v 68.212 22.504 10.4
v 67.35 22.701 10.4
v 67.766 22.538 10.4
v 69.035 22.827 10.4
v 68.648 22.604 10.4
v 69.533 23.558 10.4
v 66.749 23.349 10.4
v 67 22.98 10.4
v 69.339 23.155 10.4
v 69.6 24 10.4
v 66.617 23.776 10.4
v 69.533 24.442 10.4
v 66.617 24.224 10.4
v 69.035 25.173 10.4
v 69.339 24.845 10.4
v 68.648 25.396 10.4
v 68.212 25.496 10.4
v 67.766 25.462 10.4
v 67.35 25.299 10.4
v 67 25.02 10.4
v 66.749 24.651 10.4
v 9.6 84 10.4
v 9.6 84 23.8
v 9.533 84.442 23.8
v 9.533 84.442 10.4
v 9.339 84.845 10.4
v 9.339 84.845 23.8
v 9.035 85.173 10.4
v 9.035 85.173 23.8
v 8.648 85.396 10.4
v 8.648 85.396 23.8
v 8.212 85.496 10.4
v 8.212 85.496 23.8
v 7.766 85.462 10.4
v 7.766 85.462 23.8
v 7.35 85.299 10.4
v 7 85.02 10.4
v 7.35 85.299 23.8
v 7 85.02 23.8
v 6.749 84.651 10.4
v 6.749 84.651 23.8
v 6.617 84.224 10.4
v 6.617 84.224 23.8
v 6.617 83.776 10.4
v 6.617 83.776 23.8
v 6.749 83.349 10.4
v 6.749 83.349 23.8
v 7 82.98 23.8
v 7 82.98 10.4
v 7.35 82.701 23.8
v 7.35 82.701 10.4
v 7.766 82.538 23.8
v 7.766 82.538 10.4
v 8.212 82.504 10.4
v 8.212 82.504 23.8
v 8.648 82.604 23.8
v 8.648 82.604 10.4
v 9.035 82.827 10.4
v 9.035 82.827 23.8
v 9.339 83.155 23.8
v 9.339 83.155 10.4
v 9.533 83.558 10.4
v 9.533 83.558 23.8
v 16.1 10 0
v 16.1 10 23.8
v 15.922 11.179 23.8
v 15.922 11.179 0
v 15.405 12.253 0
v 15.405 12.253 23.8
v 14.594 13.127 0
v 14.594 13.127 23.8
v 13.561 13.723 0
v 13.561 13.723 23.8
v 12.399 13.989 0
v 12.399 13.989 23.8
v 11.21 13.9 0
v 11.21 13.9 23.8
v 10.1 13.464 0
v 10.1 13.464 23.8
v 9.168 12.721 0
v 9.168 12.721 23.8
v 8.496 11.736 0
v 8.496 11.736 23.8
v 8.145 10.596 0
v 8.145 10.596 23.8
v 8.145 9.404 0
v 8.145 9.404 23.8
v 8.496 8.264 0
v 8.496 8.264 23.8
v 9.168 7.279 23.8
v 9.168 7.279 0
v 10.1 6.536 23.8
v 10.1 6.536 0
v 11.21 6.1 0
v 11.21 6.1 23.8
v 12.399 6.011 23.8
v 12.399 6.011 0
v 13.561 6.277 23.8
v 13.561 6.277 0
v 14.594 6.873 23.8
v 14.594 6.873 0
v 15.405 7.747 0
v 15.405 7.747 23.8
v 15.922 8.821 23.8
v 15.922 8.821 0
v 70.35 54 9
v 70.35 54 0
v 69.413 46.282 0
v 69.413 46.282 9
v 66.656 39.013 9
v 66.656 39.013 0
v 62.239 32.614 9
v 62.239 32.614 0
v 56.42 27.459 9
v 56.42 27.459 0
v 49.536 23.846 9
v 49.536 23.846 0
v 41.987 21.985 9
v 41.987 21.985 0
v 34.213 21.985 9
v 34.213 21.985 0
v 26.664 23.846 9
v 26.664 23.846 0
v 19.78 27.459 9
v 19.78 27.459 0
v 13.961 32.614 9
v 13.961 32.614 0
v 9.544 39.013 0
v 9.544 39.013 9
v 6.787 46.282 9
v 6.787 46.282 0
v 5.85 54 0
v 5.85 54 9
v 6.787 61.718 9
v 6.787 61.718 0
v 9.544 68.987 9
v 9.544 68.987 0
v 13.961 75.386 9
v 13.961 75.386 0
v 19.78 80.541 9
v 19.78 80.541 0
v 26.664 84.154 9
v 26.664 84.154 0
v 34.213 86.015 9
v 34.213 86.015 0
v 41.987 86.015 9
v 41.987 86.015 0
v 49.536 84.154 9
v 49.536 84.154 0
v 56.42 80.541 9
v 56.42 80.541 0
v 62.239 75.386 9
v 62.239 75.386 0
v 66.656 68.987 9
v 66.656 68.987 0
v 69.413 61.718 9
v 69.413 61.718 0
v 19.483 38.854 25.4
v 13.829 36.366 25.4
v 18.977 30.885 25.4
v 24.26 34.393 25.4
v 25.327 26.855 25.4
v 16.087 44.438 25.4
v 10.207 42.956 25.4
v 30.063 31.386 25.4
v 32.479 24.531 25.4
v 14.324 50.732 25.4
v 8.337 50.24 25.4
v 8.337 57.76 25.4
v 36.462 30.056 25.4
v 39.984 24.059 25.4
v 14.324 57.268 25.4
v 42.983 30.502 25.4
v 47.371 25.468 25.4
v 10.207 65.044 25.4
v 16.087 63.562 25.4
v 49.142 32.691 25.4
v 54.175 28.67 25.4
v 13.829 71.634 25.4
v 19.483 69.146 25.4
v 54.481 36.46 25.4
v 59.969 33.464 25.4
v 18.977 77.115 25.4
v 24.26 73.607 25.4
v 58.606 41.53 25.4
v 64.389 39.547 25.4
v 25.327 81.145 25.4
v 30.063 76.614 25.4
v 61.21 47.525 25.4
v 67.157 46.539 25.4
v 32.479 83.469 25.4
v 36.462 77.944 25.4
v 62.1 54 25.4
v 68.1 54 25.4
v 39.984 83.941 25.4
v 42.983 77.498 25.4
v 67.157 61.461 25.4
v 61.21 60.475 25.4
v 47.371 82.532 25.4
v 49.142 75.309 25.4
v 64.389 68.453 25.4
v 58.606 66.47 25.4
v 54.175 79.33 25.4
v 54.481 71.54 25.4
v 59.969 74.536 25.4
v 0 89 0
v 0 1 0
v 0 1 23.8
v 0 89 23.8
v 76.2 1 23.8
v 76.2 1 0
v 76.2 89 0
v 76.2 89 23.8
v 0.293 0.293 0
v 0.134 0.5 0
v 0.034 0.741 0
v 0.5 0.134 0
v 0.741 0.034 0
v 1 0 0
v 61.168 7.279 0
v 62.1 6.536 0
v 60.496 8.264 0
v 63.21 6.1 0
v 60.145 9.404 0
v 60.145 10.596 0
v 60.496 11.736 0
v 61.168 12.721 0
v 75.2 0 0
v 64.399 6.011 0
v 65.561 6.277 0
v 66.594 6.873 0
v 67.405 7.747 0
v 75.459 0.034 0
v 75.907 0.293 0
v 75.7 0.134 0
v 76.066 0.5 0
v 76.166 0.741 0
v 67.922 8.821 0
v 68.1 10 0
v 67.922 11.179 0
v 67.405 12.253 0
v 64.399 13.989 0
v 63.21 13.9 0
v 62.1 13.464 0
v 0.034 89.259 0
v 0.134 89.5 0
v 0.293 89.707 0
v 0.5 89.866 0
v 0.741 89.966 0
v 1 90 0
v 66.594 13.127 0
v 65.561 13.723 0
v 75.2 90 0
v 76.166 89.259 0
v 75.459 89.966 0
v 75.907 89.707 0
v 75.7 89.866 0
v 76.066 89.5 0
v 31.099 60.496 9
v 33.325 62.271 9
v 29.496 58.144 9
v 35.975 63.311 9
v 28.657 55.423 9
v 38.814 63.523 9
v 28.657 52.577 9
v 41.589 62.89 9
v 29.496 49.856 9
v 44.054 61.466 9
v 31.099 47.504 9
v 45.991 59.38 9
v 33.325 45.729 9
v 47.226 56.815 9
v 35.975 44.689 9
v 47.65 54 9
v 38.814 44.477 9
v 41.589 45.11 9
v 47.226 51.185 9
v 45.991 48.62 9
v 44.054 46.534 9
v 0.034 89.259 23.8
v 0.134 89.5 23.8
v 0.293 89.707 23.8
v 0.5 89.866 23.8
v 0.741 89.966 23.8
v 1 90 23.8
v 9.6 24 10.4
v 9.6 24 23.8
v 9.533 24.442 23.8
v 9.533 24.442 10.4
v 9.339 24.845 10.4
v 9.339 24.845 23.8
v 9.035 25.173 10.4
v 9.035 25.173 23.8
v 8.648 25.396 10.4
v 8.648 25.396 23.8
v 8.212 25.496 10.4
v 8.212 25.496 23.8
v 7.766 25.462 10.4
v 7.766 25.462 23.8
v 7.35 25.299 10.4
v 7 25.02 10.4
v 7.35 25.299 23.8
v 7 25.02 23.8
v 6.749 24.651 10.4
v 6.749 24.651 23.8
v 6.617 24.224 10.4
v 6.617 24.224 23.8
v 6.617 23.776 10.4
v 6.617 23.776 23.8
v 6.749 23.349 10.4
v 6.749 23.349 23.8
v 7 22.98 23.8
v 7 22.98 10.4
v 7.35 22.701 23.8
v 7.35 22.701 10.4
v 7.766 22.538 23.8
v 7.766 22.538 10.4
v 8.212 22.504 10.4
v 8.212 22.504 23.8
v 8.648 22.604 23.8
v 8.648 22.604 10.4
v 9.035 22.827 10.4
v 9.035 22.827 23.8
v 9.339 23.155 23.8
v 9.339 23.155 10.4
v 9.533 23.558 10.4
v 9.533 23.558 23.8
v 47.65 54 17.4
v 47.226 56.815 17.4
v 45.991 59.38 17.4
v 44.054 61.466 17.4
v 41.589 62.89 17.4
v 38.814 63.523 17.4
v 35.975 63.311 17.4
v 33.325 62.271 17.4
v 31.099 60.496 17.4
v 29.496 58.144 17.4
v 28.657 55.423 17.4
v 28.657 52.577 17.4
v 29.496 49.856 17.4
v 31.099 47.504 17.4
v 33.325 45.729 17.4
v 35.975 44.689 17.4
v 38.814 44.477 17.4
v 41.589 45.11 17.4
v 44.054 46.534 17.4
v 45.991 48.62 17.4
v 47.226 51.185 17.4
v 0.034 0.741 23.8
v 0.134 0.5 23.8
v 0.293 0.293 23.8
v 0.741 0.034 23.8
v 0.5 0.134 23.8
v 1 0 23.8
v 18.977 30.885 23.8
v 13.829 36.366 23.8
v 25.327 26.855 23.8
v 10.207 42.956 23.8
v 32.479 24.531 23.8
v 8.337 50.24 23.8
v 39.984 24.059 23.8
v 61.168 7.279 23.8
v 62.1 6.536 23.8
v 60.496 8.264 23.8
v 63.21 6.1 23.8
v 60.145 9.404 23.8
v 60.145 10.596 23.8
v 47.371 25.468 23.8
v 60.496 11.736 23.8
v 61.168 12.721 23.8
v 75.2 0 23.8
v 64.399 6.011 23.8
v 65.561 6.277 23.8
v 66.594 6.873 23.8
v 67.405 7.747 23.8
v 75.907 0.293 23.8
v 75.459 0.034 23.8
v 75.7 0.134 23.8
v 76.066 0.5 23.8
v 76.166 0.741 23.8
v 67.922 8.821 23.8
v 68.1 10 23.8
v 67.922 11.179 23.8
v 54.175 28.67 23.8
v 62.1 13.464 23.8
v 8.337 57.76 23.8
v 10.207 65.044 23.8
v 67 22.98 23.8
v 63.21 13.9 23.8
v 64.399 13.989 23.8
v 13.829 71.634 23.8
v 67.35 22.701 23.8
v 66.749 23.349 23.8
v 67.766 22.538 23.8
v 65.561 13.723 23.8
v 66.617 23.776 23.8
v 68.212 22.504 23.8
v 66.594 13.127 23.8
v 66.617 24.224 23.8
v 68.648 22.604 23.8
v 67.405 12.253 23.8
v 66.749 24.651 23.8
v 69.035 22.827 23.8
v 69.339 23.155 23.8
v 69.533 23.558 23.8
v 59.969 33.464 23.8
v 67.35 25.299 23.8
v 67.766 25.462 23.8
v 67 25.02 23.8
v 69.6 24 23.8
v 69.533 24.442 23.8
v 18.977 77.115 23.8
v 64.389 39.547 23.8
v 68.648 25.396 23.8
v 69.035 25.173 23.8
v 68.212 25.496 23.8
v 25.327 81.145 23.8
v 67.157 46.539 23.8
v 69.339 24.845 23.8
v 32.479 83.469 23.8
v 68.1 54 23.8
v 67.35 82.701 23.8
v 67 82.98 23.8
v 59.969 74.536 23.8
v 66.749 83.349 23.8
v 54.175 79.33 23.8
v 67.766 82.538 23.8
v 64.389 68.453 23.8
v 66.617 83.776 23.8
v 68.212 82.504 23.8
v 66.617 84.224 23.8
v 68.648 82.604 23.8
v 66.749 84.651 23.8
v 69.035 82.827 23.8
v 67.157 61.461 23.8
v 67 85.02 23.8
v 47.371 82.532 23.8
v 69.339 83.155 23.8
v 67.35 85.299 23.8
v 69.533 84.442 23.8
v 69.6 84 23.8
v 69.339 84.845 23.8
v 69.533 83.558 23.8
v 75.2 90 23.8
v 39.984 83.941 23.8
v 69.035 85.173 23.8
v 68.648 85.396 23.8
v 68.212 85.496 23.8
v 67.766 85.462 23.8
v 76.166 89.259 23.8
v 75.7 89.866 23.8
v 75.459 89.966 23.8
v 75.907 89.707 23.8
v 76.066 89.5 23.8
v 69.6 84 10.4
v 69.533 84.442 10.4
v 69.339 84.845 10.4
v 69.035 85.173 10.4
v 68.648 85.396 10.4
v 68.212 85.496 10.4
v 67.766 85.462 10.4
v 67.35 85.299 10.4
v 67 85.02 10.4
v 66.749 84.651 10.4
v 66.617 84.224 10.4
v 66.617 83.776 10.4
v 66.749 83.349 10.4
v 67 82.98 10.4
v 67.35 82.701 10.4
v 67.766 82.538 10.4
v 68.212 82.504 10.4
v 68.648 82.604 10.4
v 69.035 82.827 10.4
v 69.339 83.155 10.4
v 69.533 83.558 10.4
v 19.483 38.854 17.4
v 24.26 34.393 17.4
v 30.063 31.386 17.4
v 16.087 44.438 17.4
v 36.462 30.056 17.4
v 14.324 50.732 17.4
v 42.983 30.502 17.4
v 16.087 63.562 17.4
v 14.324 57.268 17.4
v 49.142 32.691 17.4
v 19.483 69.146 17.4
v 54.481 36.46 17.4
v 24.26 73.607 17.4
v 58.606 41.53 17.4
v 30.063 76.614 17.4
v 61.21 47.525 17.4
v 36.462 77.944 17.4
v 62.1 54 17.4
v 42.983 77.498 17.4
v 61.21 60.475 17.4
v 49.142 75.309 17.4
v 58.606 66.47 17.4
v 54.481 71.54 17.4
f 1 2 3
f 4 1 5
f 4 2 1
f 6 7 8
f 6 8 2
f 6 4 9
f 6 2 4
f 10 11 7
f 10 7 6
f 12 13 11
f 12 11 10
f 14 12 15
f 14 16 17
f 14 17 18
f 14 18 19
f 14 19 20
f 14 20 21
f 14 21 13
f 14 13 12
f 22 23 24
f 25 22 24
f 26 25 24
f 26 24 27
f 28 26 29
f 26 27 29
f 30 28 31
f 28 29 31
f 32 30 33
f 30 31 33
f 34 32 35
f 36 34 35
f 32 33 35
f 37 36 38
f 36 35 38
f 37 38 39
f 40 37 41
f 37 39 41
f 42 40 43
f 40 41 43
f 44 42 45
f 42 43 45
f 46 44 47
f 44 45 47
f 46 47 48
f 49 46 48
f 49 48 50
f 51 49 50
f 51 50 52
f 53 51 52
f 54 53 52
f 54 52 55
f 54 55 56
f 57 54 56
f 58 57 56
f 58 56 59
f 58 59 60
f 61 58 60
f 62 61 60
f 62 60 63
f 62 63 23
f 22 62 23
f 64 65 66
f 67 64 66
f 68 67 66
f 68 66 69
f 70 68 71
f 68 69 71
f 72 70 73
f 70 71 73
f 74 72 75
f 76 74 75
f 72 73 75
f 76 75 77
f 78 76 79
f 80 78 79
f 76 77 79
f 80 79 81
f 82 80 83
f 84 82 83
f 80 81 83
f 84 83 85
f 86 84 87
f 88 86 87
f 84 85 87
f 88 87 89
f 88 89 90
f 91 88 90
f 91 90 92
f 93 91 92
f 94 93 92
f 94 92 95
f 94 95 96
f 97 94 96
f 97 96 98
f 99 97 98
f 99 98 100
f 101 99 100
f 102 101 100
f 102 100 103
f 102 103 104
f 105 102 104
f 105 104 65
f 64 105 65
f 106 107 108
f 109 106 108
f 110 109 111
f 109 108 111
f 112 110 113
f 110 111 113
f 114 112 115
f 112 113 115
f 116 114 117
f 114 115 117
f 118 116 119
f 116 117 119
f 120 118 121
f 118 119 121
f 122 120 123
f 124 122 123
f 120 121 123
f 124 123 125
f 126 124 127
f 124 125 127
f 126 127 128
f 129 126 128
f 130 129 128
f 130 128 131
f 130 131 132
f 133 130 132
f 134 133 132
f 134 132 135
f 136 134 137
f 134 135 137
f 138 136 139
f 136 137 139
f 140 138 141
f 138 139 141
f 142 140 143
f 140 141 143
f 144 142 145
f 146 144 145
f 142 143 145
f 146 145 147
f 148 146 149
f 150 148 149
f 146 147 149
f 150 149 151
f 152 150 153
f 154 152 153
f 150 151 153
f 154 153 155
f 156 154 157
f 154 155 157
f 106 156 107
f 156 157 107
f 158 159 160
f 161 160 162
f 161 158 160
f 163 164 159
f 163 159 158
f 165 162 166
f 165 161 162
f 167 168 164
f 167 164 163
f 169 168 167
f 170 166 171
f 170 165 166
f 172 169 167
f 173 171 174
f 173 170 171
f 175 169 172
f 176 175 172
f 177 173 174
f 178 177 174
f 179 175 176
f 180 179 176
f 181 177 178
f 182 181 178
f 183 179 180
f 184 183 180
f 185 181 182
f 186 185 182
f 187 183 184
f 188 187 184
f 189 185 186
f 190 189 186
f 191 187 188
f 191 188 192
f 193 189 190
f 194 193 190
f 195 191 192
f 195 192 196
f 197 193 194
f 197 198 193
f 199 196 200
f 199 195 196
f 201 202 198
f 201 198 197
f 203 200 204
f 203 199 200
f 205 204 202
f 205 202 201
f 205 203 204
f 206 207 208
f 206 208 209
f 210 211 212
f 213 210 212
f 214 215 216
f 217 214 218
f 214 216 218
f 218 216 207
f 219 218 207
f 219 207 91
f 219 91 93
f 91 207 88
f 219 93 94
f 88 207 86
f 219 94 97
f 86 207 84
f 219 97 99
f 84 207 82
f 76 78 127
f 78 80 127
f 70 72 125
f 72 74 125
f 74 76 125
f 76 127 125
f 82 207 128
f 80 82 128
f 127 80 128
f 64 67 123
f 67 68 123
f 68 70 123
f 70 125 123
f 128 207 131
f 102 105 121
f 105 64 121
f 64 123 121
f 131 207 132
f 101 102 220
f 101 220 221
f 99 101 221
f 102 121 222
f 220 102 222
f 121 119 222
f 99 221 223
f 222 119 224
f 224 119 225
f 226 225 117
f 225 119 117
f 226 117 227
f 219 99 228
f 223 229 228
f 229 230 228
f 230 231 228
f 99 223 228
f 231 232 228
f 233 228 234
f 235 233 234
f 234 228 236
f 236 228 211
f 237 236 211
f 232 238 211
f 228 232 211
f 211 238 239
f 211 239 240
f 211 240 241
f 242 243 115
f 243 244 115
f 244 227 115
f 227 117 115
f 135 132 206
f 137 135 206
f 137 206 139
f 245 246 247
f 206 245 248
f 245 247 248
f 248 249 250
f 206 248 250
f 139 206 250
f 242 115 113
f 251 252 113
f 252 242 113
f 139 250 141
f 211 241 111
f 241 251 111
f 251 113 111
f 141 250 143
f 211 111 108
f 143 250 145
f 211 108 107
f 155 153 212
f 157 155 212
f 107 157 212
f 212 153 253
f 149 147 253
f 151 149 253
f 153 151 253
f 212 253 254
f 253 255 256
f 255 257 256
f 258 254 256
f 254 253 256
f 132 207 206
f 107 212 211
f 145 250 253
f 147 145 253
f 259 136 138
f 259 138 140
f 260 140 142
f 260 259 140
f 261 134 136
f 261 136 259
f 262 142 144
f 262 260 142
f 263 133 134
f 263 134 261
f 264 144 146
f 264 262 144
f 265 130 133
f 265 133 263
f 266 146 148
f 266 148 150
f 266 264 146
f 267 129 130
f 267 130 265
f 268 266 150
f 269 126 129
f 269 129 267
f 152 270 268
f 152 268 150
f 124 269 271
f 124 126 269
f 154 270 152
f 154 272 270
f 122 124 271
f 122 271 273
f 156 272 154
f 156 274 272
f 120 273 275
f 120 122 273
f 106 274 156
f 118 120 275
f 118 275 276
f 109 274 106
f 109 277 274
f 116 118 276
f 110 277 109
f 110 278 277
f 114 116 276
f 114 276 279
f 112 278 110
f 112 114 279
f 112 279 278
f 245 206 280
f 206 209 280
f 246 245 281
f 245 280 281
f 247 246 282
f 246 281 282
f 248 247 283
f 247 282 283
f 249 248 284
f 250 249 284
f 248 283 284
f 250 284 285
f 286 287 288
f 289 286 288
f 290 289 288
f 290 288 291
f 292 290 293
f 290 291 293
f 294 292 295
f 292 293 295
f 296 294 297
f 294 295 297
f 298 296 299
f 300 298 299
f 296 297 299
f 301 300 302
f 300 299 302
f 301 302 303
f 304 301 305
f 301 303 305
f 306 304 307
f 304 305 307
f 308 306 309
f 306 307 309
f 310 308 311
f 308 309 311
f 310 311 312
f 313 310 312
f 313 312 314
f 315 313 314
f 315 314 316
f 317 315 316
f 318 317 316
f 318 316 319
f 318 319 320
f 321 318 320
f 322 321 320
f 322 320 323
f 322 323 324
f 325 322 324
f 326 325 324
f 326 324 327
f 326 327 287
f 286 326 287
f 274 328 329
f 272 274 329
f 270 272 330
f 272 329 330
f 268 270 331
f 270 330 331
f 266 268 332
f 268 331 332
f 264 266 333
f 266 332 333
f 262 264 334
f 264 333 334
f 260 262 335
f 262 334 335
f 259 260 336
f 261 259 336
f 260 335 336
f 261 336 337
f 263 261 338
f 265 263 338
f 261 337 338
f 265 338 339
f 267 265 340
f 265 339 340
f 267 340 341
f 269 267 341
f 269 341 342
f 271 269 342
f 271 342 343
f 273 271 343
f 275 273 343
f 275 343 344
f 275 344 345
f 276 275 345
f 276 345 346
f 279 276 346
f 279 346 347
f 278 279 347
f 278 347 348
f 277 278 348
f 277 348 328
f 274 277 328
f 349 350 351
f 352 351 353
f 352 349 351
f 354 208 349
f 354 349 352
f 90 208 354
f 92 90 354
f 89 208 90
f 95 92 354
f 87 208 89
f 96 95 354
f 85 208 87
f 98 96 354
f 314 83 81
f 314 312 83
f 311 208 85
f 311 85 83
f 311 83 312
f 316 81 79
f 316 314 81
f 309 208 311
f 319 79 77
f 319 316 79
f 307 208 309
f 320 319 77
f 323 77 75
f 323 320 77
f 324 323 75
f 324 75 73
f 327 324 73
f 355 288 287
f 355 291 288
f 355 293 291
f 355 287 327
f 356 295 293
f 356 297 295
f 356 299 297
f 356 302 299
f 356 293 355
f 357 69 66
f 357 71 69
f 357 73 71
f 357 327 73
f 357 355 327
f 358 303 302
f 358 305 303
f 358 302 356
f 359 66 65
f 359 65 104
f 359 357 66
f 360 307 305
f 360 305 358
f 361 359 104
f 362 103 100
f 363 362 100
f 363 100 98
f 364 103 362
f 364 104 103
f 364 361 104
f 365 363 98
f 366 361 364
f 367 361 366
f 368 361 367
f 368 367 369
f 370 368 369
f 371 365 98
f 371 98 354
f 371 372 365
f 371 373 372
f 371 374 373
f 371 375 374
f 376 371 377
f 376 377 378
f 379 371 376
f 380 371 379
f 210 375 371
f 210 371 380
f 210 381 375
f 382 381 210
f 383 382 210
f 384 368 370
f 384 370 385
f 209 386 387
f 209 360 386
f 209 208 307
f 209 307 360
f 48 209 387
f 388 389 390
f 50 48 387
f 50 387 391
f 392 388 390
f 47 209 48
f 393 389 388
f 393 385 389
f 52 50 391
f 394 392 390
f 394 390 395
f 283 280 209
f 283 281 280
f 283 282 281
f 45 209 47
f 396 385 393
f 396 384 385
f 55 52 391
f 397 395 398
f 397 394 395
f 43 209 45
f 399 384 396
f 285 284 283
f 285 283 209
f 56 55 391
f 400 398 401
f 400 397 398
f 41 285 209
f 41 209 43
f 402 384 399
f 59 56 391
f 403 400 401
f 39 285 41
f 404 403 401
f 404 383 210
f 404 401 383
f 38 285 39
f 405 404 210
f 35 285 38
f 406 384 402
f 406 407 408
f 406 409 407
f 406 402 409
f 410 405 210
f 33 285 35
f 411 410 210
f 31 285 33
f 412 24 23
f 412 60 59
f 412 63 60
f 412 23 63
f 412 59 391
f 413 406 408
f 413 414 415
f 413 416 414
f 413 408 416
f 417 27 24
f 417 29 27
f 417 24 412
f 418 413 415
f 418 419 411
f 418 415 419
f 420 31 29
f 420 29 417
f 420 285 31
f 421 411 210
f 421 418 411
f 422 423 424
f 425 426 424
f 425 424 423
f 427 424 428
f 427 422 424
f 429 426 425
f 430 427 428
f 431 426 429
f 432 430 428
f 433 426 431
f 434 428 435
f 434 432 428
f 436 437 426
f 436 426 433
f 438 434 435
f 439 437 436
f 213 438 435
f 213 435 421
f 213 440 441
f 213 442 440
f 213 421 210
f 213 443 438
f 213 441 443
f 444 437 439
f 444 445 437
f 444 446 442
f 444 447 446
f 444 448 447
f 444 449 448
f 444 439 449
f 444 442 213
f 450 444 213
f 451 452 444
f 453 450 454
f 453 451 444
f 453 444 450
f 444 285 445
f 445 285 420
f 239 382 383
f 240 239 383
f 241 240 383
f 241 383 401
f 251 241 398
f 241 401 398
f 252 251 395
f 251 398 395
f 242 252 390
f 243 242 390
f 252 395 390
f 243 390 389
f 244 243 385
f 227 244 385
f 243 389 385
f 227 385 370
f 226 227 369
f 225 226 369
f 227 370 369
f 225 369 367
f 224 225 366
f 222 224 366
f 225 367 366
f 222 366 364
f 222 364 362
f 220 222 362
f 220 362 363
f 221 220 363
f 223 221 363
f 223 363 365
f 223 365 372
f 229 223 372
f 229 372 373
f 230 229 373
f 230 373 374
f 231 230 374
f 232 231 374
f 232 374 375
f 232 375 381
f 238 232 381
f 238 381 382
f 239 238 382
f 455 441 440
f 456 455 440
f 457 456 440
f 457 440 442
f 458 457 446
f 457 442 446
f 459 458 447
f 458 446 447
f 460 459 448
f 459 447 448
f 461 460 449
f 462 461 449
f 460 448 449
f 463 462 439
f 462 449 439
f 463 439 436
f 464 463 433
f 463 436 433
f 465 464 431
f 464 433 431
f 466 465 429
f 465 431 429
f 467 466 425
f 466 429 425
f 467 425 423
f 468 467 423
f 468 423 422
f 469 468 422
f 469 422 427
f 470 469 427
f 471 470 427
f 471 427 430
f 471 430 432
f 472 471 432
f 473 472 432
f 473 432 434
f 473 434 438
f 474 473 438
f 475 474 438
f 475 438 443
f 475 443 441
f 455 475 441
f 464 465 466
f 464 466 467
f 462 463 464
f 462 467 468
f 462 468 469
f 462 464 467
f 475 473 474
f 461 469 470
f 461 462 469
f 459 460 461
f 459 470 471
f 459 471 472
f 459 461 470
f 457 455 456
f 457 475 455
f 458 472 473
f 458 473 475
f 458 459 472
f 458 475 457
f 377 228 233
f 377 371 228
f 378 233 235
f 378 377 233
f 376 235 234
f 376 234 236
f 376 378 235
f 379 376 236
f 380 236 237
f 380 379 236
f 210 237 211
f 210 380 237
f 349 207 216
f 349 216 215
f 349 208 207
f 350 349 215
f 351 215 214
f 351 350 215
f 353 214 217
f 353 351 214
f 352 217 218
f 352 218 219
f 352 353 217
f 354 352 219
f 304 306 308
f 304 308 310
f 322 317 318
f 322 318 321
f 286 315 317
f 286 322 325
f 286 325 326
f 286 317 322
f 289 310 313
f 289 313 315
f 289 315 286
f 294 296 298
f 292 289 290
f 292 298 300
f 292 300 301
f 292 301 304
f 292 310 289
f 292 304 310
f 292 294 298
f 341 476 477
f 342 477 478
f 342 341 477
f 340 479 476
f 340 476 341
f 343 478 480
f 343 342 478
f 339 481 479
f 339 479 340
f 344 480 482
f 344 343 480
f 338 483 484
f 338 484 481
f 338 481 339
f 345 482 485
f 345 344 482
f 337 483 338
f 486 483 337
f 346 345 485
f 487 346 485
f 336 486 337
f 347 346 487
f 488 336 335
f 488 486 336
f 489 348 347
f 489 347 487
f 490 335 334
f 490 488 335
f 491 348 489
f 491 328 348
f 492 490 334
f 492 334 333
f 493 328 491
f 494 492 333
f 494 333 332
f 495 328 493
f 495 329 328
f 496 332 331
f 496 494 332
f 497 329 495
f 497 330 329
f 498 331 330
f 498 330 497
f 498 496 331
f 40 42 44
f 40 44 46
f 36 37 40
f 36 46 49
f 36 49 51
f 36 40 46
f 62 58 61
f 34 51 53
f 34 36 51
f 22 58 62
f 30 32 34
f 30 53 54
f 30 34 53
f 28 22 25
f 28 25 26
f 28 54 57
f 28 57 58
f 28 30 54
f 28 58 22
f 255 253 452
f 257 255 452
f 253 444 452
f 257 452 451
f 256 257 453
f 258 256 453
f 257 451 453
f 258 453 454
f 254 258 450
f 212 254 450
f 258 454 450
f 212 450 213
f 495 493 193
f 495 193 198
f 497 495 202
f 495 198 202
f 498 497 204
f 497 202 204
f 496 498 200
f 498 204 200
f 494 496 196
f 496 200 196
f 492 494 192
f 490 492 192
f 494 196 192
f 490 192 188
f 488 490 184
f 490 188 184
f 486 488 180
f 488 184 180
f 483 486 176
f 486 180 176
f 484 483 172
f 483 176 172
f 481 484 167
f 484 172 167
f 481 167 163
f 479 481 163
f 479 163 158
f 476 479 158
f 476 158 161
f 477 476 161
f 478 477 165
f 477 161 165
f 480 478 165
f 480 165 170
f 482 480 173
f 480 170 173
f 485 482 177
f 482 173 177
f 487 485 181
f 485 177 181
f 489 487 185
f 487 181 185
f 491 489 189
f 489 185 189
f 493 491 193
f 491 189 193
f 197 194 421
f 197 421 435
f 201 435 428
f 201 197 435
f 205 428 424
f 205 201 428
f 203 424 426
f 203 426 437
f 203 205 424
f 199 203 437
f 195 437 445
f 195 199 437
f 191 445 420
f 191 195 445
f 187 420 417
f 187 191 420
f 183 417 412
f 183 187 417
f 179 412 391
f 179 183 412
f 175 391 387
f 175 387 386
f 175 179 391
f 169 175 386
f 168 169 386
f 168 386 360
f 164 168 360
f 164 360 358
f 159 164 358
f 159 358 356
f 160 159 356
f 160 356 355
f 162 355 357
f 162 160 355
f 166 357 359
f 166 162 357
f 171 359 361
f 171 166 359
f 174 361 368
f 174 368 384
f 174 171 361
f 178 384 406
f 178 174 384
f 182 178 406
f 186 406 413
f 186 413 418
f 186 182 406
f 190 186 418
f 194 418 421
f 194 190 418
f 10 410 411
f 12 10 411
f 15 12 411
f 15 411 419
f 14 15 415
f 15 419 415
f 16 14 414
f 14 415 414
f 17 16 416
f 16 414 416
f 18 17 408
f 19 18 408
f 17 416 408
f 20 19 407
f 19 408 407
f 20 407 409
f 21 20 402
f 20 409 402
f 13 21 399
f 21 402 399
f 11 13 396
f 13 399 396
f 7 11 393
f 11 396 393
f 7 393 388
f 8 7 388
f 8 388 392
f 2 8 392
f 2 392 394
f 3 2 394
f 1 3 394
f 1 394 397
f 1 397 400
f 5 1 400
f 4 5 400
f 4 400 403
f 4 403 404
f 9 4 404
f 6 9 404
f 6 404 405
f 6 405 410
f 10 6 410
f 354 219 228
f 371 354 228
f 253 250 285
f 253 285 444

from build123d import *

# Parameters (mm, degrees)
F0_W      = 76.2
F0_H      = 90
F1_DEPTH  = 25.4
F2_R      = 9.55
F2_R_2    = 4
F3_DEPTH  = 25.4
F5_R      = 1.5
F6_DEPTH  = 15
F7_W      = 95.184714
F7_H      = 99.811753
F7_R      = 30
F8_DEPTH  = 1.6
F9_R      = 24
F10_DEPTH = 8
F11_R     = 32.25
F12_DEPTH = 9
F13_R     = 1


with BuildPart() as f1:
    # F0 (on Top) → F1 (new body)
    with BuildSketch(Plane.XY):
        with Locations((38.1, 45)):
            Rectangle(F0_W, F0_H)
    extrude(amount=F1_DEPTH)

    # F2 (on face) → F3 (cut, through all)
    with BuildSketch(Plane.XY.offset(25.4)):
        with Locations((38.1, 54)):
            Circle(F2_R)
        with Locations((12.1, 10)):
            Circle(F2_R_2)
        with Locations((64.1, 10)):
            Circle(F2_R_2)
    extrude(amount=-F3_DEPTH, mode=Mode.SUBTRACT)

    # F5 (on face) → F6 (cut)
    with BuildSketch(Plane.XY.offset(25.4)):
        with Locations((8.1, 84)):
            Circle(F5_R)
        with Locations((68.1, 84)):
            Circle(F5_R)
        with Locations((68.1, 24)):
            Circle(F5_R)
        with Locations((8.1, 24)):
            Circle(F5_R)
    extrude(amount=-F6_DEPTH, mode=Mode.SUBTRACT)

    # F7 (on face) → F8 (cut)
    with BuildSketch(Plane.XY.offset(25.4)):
        with Locations((40.338032, 44.112226)):
            Rectangle(F7_W, F7_H)
        with Locations((38.1, 54)):
            Circle(F7_R, mode=Mode.SUBTRACT)
    extrude(amount=-F8_DEPTH, mode=Mode.SUBTRACT)

    # F9 (on face) → F10 (cut)
    with BuildSketch(Plane.XY.offset(25.4)):
        with Locations((38.1, 54)):
            Circle(F9_R)
    extrude(amount=-F10_DEPTH, mode=Mode.SUBTRACT)

    # F11 (on face) → F12 (cut)
    with BuildSketch(Plane(origin=(0, 0, 0), x_dir=(1, 0, 0), z_dir=(0, 0, -1))):
        with Locations((38.1, -54)):
            Circle(F11_R)
    extrude(amount=-F12_DEPTH, mode=Mode.SUBTRACT)

    # F13
    f13_edges = [f1.edges().sort_by_distance(p)[0] for p in [
        (76.2, 0, 11.9),
        (0, 0, 11.9),
        (76.2, 90, 11.9),
        (0, 90, 11.9),
    ]]
    fillet(f13_edges, radius=F13_R)


solid = f1.part
